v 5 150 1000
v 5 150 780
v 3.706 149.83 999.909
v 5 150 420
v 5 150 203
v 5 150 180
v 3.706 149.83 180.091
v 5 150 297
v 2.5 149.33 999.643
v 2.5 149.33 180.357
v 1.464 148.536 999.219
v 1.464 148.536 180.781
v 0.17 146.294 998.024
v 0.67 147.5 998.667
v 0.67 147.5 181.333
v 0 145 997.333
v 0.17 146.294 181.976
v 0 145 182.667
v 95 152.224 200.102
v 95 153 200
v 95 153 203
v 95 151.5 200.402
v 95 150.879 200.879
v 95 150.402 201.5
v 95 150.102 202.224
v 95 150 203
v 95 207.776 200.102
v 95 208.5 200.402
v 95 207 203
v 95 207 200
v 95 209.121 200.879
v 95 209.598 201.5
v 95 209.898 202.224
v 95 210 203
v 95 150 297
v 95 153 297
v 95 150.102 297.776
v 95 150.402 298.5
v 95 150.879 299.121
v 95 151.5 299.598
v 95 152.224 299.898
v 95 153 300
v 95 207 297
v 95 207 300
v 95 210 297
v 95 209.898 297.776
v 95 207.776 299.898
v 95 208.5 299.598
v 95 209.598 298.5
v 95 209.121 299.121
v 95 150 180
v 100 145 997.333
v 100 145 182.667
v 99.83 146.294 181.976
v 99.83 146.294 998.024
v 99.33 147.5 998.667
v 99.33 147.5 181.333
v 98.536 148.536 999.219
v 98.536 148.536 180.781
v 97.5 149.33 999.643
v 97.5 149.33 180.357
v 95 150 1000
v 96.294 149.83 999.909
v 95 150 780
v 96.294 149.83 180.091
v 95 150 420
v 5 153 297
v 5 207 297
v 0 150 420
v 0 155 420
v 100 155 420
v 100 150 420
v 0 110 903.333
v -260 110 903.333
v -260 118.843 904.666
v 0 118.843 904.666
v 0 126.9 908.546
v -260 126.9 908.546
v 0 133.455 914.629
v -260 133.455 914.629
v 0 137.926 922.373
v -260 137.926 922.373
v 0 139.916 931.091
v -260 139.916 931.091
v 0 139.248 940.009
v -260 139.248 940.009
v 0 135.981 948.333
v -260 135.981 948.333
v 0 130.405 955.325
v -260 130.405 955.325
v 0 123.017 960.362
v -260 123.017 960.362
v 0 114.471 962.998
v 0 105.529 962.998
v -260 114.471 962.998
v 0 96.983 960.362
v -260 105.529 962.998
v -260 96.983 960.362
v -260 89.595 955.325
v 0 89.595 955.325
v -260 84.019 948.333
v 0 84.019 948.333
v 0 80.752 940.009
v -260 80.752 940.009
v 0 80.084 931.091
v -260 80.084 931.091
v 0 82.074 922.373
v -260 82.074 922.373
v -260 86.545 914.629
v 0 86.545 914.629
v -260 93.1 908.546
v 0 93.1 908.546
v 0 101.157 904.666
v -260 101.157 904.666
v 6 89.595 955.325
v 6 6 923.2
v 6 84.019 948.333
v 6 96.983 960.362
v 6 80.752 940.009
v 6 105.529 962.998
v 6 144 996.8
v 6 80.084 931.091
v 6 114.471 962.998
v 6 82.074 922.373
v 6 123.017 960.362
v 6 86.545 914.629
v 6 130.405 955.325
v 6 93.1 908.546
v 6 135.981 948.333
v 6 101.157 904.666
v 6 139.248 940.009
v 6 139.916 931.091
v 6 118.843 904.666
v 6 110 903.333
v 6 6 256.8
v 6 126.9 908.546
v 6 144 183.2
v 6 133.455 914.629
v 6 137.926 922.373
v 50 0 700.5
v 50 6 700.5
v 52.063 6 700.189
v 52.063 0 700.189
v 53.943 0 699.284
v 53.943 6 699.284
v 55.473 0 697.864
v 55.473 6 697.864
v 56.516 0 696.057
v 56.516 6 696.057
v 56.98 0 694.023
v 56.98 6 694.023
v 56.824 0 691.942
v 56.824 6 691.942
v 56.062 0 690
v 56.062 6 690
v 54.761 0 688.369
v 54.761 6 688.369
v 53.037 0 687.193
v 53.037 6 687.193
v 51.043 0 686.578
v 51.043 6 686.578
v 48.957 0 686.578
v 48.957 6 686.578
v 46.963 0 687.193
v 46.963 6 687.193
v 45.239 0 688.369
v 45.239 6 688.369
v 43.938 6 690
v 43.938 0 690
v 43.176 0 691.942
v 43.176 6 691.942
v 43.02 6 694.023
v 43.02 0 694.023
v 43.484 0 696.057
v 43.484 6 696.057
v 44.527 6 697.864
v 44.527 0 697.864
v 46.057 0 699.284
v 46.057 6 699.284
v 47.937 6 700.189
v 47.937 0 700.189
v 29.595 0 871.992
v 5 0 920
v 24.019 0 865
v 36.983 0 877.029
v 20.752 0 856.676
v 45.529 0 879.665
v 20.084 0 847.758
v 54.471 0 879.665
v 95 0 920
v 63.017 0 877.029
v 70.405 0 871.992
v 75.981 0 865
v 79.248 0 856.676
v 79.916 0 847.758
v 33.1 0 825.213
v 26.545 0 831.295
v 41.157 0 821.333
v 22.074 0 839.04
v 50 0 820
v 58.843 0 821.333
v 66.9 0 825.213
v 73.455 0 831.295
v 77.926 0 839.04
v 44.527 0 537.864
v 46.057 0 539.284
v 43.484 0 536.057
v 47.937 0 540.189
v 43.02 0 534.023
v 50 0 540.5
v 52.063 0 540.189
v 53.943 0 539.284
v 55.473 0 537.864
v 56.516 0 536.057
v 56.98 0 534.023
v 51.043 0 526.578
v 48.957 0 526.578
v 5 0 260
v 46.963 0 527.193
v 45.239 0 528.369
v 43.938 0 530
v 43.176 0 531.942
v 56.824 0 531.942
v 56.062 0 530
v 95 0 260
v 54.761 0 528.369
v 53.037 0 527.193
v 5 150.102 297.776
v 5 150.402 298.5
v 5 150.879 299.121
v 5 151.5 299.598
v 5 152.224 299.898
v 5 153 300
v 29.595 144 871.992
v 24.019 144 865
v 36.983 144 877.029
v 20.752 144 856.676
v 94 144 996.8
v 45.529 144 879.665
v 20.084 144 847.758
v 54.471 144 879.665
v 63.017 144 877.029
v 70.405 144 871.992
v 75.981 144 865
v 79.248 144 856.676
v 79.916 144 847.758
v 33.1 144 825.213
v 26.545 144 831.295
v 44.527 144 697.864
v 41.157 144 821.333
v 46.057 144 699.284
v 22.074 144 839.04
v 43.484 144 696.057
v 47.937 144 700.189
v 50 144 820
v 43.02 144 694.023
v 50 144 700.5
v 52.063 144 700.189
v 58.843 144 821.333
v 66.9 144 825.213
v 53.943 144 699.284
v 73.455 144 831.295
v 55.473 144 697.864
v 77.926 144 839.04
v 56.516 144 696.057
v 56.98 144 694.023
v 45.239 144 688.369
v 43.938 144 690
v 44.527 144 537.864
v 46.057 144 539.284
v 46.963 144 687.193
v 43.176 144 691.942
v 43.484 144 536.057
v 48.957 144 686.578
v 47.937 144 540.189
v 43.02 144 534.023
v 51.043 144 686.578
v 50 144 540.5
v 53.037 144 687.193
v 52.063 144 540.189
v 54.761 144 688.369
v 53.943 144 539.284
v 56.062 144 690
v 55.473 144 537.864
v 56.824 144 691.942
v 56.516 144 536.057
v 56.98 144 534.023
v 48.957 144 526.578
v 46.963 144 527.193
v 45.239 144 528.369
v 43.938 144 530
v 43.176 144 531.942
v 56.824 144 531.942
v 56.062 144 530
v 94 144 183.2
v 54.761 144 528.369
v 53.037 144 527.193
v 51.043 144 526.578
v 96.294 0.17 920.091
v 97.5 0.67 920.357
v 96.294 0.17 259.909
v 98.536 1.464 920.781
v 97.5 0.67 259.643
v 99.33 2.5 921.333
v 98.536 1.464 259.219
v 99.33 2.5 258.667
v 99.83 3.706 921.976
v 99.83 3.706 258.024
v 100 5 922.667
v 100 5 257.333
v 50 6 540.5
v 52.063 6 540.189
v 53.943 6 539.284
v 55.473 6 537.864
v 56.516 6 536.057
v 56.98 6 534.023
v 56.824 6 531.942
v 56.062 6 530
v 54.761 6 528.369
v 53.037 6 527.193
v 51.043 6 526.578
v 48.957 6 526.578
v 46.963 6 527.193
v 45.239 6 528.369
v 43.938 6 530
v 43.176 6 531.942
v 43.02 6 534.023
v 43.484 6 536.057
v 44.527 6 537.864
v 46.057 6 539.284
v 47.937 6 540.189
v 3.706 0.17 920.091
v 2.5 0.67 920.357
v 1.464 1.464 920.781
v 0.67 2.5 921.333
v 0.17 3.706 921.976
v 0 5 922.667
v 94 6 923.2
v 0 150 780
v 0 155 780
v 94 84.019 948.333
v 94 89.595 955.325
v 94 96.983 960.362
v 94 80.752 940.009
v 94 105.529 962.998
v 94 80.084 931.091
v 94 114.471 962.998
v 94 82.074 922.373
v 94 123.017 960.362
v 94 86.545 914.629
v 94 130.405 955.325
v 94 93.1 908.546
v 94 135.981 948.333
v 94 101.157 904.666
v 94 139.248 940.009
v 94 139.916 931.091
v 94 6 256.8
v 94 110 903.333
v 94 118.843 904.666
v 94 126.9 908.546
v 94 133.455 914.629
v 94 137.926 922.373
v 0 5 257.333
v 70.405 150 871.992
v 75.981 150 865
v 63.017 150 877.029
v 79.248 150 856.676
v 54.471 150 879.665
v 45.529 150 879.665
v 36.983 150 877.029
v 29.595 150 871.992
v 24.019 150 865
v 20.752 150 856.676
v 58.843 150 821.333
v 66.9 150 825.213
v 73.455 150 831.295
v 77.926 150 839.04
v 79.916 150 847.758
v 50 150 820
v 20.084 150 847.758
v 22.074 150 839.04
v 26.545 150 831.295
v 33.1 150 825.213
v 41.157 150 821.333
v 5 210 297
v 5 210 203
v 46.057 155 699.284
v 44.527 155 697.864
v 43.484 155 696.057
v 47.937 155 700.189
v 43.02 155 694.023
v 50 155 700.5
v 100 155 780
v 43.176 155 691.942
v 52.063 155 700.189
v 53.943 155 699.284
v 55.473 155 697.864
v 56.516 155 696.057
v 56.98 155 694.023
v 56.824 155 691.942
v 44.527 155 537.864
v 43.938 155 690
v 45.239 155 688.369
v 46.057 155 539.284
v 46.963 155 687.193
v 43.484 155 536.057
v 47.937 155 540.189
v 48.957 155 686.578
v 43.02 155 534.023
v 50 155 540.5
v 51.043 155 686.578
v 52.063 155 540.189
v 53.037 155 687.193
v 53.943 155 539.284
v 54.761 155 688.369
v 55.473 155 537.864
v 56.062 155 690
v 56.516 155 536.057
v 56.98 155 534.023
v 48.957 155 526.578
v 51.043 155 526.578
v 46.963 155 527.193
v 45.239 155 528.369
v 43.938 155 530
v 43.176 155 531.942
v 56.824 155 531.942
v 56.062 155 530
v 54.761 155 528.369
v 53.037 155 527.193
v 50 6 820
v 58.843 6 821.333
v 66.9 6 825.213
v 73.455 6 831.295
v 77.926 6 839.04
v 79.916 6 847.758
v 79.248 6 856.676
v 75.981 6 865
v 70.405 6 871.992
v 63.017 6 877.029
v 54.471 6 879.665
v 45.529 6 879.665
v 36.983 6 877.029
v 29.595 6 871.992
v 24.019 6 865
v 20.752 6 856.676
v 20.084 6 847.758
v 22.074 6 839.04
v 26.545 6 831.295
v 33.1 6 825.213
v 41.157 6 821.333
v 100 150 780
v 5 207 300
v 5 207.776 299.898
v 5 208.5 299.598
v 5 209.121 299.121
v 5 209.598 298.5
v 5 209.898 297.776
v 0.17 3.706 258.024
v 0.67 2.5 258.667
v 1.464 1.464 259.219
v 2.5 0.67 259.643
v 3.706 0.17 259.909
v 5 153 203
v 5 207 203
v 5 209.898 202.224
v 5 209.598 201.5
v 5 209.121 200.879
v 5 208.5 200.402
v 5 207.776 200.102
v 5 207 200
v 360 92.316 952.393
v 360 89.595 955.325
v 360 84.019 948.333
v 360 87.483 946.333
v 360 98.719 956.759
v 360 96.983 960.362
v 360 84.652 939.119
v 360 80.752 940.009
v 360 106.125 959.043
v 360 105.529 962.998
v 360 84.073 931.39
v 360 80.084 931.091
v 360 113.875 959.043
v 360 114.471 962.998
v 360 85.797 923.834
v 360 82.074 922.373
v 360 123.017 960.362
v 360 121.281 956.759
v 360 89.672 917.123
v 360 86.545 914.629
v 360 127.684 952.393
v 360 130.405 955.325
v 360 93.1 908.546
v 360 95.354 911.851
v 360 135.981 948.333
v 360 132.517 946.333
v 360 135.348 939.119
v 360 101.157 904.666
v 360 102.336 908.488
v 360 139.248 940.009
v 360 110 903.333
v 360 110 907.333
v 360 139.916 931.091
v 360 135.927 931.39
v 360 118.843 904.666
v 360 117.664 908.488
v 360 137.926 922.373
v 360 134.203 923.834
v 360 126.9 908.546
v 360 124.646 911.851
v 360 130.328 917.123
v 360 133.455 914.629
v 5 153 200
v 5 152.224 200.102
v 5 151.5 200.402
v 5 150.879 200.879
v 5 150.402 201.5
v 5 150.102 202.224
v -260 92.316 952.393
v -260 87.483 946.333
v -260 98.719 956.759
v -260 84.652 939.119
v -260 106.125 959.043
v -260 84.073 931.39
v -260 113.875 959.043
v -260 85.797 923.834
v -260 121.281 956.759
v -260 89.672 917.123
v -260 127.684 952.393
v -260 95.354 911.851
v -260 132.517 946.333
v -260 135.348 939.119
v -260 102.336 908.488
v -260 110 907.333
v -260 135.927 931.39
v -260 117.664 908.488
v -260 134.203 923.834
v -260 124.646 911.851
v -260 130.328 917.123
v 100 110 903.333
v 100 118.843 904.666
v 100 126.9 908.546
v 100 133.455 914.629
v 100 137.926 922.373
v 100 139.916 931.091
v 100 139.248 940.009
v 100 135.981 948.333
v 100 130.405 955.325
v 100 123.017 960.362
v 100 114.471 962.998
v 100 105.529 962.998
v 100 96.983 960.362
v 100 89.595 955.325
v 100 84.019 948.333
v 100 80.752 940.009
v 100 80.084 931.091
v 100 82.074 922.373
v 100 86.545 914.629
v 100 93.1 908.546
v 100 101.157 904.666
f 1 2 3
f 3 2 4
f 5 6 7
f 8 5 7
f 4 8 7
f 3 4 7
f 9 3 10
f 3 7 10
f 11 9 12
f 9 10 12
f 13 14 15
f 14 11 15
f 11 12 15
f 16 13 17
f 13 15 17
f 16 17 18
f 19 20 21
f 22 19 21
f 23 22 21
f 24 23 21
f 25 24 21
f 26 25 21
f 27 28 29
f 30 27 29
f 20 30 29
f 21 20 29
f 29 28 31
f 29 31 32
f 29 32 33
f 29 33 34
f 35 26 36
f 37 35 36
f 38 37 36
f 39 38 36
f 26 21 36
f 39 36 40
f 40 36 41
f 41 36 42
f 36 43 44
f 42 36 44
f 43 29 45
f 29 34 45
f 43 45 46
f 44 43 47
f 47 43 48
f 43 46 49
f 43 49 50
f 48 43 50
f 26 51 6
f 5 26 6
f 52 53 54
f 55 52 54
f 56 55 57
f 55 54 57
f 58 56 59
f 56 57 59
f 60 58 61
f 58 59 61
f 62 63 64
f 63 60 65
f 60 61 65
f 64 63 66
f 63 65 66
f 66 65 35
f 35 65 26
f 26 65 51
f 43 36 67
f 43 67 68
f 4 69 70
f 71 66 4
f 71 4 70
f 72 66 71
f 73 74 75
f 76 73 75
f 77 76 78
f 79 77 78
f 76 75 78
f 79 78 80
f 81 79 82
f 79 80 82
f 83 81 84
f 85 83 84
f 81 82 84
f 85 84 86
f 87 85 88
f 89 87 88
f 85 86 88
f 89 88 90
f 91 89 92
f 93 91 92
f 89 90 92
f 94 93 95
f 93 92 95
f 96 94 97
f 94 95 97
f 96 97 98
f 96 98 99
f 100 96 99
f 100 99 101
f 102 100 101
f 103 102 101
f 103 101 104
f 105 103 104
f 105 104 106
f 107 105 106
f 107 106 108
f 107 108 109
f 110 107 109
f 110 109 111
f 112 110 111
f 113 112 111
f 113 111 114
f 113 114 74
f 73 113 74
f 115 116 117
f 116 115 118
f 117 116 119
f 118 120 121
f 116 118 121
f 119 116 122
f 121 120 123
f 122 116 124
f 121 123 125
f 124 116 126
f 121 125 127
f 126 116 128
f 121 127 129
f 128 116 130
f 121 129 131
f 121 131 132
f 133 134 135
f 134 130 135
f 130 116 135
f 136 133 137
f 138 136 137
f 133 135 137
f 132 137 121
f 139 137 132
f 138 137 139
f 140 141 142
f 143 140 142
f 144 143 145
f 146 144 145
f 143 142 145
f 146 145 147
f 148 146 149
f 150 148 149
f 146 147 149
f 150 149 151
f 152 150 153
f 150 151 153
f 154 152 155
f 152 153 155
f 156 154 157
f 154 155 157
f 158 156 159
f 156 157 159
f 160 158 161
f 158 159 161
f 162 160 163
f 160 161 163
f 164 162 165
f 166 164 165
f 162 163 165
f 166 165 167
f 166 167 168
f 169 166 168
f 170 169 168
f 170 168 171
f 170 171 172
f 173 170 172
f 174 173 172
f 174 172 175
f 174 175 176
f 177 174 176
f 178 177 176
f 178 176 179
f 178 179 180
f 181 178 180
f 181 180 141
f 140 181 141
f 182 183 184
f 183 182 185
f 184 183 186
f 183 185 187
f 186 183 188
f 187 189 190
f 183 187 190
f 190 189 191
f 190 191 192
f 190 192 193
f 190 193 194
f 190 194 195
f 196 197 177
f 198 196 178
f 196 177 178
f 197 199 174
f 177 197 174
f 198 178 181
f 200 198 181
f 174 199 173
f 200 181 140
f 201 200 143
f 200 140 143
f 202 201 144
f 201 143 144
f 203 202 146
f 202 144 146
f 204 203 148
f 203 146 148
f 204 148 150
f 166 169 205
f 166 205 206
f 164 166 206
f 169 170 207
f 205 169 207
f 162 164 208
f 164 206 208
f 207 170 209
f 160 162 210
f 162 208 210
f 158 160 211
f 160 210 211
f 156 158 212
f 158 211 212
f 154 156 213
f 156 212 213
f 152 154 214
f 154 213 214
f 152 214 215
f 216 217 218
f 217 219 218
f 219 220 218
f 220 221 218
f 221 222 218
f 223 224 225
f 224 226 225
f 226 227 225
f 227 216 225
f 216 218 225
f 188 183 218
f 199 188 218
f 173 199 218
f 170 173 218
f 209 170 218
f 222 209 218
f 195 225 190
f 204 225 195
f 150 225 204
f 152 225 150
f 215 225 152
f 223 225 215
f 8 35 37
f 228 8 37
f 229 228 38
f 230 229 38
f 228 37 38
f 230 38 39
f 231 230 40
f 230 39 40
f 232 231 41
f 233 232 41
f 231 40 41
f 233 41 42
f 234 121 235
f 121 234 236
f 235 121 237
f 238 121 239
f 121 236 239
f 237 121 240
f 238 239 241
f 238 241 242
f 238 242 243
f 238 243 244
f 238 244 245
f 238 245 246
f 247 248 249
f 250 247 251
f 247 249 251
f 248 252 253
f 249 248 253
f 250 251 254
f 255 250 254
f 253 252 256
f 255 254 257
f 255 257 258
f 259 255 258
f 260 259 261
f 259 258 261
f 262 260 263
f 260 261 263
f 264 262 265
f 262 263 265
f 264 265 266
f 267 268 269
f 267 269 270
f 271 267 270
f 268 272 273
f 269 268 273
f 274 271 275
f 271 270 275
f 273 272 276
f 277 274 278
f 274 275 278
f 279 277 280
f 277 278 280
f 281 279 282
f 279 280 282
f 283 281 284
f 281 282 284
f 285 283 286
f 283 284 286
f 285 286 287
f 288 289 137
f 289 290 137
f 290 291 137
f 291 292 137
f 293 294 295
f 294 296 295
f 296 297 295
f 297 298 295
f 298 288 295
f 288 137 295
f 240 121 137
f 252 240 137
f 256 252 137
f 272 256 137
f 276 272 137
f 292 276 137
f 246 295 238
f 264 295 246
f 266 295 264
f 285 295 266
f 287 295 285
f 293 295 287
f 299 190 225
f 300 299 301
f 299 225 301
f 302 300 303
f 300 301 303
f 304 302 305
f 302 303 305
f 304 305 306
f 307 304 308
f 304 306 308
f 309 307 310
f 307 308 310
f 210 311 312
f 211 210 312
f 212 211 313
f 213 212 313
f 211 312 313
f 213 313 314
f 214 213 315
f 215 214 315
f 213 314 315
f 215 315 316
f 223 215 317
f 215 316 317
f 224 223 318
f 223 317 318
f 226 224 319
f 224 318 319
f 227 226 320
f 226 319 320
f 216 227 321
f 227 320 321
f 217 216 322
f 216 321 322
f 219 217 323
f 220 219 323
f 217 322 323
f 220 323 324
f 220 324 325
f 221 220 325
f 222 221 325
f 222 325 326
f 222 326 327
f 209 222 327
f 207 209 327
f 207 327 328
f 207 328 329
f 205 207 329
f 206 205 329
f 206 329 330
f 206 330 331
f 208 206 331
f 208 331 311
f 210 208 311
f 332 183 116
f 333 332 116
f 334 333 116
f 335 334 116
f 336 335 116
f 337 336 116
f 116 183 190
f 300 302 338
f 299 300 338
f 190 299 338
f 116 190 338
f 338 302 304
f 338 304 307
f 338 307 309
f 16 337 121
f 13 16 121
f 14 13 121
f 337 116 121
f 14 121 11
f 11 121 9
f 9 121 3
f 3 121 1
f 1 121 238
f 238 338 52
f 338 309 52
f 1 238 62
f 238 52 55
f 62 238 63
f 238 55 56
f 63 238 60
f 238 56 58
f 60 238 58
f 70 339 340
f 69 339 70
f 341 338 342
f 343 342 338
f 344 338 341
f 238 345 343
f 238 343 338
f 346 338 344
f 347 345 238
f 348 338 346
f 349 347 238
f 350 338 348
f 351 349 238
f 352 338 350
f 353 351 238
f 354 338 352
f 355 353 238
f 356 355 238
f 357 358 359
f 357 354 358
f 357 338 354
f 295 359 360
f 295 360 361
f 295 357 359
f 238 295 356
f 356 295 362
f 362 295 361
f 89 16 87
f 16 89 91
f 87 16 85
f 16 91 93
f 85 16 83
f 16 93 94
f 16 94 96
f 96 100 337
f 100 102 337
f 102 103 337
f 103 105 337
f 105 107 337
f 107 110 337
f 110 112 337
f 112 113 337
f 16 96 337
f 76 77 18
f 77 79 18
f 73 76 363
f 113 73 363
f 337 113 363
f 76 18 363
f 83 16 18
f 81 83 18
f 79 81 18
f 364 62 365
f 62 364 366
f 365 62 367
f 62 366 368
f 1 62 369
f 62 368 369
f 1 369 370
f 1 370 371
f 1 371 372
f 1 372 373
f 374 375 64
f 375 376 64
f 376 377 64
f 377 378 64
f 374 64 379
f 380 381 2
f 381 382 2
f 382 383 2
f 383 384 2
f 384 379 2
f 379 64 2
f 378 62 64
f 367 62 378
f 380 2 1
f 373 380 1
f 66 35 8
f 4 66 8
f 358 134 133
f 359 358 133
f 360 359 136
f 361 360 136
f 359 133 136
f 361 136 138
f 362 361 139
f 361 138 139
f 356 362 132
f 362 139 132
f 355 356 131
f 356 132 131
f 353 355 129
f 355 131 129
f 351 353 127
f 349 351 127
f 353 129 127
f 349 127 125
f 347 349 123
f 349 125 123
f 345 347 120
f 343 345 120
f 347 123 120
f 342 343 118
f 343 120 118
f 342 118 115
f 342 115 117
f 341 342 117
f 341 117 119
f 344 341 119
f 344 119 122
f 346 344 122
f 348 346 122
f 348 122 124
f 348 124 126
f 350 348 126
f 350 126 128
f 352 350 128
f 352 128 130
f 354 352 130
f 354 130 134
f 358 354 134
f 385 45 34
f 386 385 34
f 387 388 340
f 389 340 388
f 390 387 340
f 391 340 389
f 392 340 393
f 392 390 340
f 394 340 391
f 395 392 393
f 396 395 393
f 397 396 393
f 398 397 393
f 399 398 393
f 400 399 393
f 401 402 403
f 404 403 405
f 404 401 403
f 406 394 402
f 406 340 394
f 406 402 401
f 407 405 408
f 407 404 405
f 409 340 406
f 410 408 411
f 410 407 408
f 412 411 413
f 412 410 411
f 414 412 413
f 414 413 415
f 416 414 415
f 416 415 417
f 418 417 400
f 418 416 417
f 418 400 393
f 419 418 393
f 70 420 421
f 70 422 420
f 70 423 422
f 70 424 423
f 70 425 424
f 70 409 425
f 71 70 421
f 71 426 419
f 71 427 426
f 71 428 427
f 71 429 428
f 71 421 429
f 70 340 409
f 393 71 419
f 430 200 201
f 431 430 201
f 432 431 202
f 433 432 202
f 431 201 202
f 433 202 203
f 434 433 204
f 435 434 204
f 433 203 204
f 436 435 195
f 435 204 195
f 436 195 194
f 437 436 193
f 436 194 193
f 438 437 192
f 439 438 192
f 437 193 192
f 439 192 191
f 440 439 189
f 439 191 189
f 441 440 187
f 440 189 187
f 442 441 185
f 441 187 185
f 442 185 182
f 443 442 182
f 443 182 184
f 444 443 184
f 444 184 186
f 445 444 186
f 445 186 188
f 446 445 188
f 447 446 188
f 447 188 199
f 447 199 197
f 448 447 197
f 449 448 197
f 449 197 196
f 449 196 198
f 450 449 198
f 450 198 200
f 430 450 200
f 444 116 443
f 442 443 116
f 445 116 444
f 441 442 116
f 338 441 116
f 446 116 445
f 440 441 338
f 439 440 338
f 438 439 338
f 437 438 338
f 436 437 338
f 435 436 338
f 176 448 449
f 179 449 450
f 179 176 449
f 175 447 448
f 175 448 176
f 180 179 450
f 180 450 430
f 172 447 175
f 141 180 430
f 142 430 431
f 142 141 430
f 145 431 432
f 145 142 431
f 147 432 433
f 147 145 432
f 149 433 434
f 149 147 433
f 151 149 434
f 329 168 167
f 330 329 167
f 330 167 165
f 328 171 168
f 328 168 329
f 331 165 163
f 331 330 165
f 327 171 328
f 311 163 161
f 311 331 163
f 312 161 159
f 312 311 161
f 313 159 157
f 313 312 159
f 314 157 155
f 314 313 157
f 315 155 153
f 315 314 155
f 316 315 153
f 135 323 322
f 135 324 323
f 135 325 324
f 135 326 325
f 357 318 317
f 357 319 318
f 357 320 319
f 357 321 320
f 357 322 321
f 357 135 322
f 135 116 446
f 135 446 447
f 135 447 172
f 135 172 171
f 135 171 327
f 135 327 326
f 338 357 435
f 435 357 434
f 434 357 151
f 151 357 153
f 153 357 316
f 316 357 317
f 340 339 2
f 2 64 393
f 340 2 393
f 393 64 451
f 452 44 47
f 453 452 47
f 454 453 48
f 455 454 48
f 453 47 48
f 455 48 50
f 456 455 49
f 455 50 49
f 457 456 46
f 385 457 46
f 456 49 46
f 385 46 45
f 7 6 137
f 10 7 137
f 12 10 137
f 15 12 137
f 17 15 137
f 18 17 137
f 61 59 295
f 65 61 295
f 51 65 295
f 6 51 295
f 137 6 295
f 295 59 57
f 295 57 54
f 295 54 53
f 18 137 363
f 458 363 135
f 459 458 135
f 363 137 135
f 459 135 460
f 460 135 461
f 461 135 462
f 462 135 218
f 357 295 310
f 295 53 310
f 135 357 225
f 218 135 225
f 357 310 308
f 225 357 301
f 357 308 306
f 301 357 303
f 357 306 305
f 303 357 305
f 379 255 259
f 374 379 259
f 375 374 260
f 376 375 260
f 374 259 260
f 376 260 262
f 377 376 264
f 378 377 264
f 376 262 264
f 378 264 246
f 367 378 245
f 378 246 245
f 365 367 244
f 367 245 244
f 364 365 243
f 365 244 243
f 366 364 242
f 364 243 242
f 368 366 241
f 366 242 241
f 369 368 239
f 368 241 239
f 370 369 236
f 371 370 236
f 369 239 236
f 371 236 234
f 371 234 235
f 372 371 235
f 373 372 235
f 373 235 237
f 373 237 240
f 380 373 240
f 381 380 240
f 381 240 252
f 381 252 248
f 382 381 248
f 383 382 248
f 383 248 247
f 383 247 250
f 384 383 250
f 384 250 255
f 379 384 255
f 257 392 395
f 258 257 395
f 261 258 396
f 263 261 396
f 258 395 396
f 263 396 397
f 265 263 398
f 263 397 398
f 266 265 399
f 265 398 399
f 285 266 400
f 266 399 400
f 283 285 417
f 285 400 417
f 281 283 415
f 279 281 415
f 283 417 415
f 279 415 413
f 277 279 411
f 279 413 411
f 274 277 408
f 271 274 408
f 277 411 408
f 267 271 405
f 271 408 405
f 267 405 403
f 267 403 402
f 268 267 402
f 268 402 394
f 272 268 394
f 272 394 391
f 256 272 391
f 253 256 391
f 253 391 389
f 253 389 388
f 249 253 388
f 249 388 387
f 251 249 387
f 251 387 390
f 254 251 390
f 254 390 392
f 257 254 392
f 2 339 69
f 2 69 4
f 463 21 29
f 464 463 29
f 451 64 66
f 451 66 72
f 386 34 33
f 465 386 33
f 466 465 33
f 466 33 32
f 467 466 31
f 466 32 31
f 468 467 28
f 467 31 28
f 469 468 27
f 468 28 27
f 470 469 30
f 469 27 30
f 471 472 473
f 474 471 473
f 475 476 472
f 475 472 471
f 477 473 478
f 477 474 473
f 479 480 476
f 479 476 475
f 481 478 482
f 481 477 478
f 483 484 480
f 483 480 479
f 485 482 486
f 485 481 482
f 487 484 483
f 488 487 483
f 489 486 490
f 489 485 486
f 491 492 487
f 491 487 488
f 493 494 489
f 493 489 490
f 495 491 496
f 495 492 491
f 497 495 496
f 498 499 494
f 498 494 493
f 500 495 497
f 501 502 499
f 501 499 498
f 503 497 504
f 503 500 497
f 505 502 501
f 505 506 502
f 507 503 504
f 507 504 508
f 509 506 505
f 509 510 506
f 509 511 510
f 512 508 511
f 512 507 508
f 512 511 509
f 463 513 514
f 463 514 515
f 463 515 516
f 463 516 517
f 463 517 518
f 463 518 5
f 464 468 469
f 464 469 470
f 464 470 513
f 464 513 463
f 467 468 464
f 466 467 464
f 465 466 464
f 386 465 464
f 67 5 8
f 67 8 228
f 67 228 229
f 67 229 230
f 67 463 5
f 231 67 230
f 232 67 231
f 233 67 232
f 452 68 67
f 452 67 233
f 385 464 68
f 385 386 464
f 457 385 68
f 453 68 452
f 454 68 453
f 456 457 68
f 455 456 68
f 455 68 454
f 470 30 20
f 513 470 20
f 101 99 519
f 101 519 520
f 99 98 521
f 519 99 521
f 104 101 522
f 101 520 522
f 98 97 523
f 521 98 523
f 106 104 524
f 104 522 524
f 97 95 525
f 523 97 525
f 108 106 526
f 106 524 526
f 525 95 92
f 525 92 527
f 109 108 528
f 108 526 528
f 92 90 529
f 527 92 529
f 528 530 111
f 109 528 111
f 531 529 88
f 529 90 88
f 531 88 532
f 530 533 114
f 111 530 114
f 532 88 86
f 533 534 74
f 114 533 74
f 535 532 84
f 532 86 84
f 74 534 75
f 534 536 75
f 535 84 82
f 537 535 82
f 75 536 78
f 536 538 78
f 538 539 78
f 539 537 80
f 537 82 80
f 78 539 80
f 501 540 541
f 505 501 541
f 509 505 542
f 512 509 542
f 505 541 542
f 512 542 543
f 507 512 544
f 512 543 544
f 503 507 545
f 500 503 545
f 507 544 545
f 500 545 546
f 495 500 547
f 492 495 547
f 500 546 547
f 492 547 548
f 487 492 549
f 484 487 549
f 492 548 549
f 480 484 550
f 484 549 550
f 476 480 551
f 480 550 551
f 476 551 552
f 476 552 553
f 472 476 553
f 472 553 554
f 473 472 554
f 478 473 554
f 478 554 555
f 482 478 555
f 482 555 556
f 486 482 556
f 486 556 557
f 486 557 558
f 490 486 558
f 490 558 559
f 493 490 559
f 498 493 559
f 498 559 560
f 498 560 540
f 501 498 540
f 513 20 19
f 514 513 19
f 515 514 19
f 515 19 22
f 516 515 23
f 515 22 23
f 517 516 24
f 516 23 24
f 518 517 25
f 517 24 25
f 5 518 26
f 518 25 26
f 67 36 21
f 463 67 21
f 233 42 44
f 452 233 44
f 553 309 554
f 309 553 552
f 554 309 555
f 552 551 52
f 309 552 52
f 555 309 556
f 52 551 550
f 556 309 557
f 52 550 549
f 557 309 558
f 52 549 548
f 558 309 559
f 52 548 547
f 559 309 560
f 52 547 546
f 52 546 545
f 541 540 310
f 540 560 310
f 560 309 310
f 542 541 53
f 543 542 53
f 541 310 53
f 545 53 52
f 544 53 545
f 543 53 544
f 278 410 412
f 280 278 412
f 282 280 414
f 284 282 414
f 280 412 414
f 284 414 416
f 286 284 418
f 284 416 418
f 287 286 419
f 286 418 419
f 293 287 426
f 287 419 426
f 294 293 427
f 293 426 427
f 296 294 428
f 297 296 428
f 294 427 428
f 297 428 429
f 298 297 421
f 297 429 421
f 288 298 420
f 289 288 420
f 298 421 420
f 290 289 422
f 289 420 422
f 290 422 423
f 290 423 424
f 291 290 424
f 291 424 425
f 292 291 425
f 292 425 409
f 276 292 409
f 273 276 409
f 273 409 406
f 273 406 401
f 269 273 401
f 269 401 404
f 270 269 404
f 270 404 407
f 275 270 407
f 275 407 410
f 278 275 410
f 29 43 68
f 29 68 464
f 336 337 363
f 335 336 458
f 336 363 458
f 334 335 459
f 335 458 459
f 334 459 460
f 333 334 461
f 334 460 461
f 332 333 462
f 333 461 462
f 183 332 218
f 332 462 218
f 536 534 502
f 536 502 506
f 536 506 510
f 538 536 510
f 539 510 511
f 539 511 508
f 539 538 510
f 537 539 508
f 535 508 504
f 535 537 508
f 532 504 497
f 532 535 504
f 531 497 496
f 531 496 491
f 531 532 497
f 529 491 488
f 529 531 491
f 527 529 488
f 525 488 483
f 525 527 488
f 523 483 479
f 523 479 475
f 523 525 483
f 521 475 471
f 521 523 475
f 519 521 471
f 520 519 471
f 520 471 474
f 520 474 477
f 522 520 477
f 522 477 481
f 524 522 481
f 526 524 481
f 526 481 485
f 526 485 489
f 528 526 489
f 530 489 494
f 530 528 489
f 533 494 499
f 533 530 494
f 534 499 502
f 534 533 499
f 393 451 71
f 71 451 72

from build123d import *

# Parameters (mm, degrees)
SCHIZZO1_W                     = 88
SCHIZZO1_H                     = 138
ESTRUSIONE_SOTTILE1_DEPTH      = 1000
ESTRUSIONE1_DEPTH              = 1017.120071645
ESTRUSIONE2_DEPTH              = 1017.120071645
SCHIZZO4_R                     = 30
ESTRUSIONE3_DEPTH              = 1017.120071645
SCHIZZO12_R                    = 7
TAGLIO_ESTRUSIONE1_DEPTH       = 1017.120071645
SCHIZZO5_W                     = 100
SCHIZZO5_H                     = 360
ESTRUSIONE4_DEPTH              = 5
SCHIZZO6_R                     = 7
ESTRUSIONE5_DEPTH              = 1017.870198206
SCHIZZO9_R                     = 30
ESTRUSIONE8_DEPTH              = 1017.870198206
ESTRUSIONE_SOTTILE2_DEPTH      = 260
ESTRUSIONE_SOTTILE2_DEPTH_BACK = 360
SCHIZZO10_R                    = 30
SCHIZZO10_R_2                  = 26
ESTRUSIONE_SOTTILE3_START      = -5
SCHIZZO11_W                    = 94
SCHIZZO11_H                    = 54
ESTRUSIONE_SOTTILE3_DEPTH      = 90


with BuildPart() as part:
    # Schizzo1 → Estrusione-Sottile1 (new body)
    with BuildSketch(Plane.XY):
        with BuildLine():
            Line((5, 0), (95, 0))
            ThreePointArc((95, 0), (98.535533906, 1.464466094), (100, 5))
            Line((100, 5), (100, 145))
            ThreePointArc((100, 145), (98.535533906, 148.535533906), (95, 150))
            Line((95, 150), (5, 150))
            ThreePointArc((5, 150), (1.464466094, 148.535533906), (0, 145))
            Line((0, 145), (0, 5))
            ThreePointArc((0, 5), (1.464466094, 1.464466094), (5, 0))
        make_face()
        with Locations((50, 75)):
            Rectangle(SCHIZZO1_W, SCHIZZO1_H, mode=Mode.SUBTRACT)
    extrude(amount=ESTRUSIONE_SOTTILE1_DEPTH)

    # Schizzo2 → Estrusione1 (cut, through all)
    with BuildSketch(Plane(origin=(100, 0, 0), x_dir=(0, 0, -1), z_dir=(1, 0, 0))):
        Polygon((-920, 0), (-1000, 150), (-1000, 0), align=None)
    extrude(amount=-ESTRUSIONE1_DEPTH, mode=Mode.SUBTRACT)

    # Schizzo3 → Estrusione2 (cut, through all)
    with BuildSketch(Plane(origin=(100, 0, 0), x_dir=(0, 0, -1), z_dir=(1, 0, 0))):
        Polygon((-180, 150), (-260, 0), (0, 0), (0, 150), align=None)
    extrude(amount=-ESTRUSIONE2_DEPTH, mode=Mode.SUBTRACT)

    # Schizzo4 → Estrusione3 (cut, through all)
    with BuildSketch(Plane.XZ):
        with Locations((50, 850)):
            Circle(SCHIZZO4_R)
    extrude(amount=-ESTRUSIONE3_DEPTH, mode=Mode.SUBTRACT)

    # Schizzo12 → Taglio-Estrusione1 (cut, through all)
    with BuildSketch(Plane(origin=(0, 150, 0), x_dir=(1, 0, 0), z_dir=(0, 1, 0))):
        with Locations((50, -693.5)):
            Circle(SCHIZZO12_R)
        with Locations((50, -533.5)):
            Circle(SCHIZZO12_R)
    extrude(amount=-TAGLIO_ESTRUSIONE1_DEPTH, mode=Mode.SUBTRACT)

    # Schizzo5 → Estrusione4 (add)
    with BuildSketch(Plane(origin=(0, 150, 0), x_dir=(1, 0, 0), z_dir=(0, 1, 0))):
        with Locations((50, -600)):
            Rectangle(SCHIZZO5_W, SCHIZZO5_H)
    extrude(amount=ESTRUSIONE4_DEPTH)

    # Schizzo6 → Estrusione5 (cut, through all)
    with BuildSketch(Plane(origin=(0, 155, 0), x_dir=(1, 0, 0), z_dir=(0, 1, 0))):
        with Locations((50, -533.5)):
            Circle(SCHIZZO6_R)
        with Locations((50, -693.5)):
            Circle(SCHIZZO6_R)
    extrude(amount=-ESTRUSIONE5_DEPTH, mode=Mode.SUBTRACT)

    # Schizzo9 → Estrusione8 (cut, through all)
    with BuildSketch(Plane(origin=(100, 0, 0), x_dir=(0, 0, -1), z_dir=(1, 0, 0))):
        with Locations((-933.333333333, 110)):
            Circle(SCHIZZO9_R)
    extrude(amount=-ESTRUSIONE8_DEPTH, mode=Mode.SUBTRACT)

    # Schizzo10 → Estrusione-Sottile2 (add, two sides: drawn at the far end of the back side and taken through both)
    with BuildSketch(Plane(origin=(100, 0, 0), x_dir=(0, 0, -1), z_dir=(1, 0, 0)).offset(-ESTRUSIONE_SOTTILE2_DEPTH_BACK)):
        with Locations((-933.333333333, 110)):
            Circle(SCHIZZO10_R)
        with Locations((-933.333333333, 110)):
            Circle(SCHIZZO10_R_2, mode=Mode.SUBTRACT)
    extrude(amount=ESTRUSIONE_SOTTILE2_DEPTH + ESTRUSIONE_SOTTILE2_DEPTH_BACK)

    # Schizzo11 → Estrusione-Sottile3 (add)
    with BuildSketch(Plane(origin=(100, 0, 0), x_dir=(0, 0, -1), z_dir=(1, 0, 0)).offset(ESTRUSIONE_SOTTILE3_START)):
        with BuildLine():
            Line((-297, 210), (-203, 210))
            ThreePointArc((-203, 210), (-200.878679656, 209.121320344), (-200, 207))
            Line((-200, 207), (-200, 153))
            ThreePointArc((-200, 153), (-200.878679656, 150.878679656), (-203, 150))
            Line((-203, 150), (-297, 150))
            ThreePointArc((-297, 150), (-299.121320344, 150.878679656), (-300, 153))
            Line((-300, 153), (-300, 207))
            ThreePointArc((-300, 207), (-299.121320344, 209.121320344), (-297, 210))
        make_face()
        with Locations((-250, 180)):
            Rectangle(SCHIZZO11_W, SCHIZZO11_H, mode=Mode.SUBTRACT)
    extrude(amount=-ESTRUSIONE_SOTTILE3_DEPTH)


solid = part.part
